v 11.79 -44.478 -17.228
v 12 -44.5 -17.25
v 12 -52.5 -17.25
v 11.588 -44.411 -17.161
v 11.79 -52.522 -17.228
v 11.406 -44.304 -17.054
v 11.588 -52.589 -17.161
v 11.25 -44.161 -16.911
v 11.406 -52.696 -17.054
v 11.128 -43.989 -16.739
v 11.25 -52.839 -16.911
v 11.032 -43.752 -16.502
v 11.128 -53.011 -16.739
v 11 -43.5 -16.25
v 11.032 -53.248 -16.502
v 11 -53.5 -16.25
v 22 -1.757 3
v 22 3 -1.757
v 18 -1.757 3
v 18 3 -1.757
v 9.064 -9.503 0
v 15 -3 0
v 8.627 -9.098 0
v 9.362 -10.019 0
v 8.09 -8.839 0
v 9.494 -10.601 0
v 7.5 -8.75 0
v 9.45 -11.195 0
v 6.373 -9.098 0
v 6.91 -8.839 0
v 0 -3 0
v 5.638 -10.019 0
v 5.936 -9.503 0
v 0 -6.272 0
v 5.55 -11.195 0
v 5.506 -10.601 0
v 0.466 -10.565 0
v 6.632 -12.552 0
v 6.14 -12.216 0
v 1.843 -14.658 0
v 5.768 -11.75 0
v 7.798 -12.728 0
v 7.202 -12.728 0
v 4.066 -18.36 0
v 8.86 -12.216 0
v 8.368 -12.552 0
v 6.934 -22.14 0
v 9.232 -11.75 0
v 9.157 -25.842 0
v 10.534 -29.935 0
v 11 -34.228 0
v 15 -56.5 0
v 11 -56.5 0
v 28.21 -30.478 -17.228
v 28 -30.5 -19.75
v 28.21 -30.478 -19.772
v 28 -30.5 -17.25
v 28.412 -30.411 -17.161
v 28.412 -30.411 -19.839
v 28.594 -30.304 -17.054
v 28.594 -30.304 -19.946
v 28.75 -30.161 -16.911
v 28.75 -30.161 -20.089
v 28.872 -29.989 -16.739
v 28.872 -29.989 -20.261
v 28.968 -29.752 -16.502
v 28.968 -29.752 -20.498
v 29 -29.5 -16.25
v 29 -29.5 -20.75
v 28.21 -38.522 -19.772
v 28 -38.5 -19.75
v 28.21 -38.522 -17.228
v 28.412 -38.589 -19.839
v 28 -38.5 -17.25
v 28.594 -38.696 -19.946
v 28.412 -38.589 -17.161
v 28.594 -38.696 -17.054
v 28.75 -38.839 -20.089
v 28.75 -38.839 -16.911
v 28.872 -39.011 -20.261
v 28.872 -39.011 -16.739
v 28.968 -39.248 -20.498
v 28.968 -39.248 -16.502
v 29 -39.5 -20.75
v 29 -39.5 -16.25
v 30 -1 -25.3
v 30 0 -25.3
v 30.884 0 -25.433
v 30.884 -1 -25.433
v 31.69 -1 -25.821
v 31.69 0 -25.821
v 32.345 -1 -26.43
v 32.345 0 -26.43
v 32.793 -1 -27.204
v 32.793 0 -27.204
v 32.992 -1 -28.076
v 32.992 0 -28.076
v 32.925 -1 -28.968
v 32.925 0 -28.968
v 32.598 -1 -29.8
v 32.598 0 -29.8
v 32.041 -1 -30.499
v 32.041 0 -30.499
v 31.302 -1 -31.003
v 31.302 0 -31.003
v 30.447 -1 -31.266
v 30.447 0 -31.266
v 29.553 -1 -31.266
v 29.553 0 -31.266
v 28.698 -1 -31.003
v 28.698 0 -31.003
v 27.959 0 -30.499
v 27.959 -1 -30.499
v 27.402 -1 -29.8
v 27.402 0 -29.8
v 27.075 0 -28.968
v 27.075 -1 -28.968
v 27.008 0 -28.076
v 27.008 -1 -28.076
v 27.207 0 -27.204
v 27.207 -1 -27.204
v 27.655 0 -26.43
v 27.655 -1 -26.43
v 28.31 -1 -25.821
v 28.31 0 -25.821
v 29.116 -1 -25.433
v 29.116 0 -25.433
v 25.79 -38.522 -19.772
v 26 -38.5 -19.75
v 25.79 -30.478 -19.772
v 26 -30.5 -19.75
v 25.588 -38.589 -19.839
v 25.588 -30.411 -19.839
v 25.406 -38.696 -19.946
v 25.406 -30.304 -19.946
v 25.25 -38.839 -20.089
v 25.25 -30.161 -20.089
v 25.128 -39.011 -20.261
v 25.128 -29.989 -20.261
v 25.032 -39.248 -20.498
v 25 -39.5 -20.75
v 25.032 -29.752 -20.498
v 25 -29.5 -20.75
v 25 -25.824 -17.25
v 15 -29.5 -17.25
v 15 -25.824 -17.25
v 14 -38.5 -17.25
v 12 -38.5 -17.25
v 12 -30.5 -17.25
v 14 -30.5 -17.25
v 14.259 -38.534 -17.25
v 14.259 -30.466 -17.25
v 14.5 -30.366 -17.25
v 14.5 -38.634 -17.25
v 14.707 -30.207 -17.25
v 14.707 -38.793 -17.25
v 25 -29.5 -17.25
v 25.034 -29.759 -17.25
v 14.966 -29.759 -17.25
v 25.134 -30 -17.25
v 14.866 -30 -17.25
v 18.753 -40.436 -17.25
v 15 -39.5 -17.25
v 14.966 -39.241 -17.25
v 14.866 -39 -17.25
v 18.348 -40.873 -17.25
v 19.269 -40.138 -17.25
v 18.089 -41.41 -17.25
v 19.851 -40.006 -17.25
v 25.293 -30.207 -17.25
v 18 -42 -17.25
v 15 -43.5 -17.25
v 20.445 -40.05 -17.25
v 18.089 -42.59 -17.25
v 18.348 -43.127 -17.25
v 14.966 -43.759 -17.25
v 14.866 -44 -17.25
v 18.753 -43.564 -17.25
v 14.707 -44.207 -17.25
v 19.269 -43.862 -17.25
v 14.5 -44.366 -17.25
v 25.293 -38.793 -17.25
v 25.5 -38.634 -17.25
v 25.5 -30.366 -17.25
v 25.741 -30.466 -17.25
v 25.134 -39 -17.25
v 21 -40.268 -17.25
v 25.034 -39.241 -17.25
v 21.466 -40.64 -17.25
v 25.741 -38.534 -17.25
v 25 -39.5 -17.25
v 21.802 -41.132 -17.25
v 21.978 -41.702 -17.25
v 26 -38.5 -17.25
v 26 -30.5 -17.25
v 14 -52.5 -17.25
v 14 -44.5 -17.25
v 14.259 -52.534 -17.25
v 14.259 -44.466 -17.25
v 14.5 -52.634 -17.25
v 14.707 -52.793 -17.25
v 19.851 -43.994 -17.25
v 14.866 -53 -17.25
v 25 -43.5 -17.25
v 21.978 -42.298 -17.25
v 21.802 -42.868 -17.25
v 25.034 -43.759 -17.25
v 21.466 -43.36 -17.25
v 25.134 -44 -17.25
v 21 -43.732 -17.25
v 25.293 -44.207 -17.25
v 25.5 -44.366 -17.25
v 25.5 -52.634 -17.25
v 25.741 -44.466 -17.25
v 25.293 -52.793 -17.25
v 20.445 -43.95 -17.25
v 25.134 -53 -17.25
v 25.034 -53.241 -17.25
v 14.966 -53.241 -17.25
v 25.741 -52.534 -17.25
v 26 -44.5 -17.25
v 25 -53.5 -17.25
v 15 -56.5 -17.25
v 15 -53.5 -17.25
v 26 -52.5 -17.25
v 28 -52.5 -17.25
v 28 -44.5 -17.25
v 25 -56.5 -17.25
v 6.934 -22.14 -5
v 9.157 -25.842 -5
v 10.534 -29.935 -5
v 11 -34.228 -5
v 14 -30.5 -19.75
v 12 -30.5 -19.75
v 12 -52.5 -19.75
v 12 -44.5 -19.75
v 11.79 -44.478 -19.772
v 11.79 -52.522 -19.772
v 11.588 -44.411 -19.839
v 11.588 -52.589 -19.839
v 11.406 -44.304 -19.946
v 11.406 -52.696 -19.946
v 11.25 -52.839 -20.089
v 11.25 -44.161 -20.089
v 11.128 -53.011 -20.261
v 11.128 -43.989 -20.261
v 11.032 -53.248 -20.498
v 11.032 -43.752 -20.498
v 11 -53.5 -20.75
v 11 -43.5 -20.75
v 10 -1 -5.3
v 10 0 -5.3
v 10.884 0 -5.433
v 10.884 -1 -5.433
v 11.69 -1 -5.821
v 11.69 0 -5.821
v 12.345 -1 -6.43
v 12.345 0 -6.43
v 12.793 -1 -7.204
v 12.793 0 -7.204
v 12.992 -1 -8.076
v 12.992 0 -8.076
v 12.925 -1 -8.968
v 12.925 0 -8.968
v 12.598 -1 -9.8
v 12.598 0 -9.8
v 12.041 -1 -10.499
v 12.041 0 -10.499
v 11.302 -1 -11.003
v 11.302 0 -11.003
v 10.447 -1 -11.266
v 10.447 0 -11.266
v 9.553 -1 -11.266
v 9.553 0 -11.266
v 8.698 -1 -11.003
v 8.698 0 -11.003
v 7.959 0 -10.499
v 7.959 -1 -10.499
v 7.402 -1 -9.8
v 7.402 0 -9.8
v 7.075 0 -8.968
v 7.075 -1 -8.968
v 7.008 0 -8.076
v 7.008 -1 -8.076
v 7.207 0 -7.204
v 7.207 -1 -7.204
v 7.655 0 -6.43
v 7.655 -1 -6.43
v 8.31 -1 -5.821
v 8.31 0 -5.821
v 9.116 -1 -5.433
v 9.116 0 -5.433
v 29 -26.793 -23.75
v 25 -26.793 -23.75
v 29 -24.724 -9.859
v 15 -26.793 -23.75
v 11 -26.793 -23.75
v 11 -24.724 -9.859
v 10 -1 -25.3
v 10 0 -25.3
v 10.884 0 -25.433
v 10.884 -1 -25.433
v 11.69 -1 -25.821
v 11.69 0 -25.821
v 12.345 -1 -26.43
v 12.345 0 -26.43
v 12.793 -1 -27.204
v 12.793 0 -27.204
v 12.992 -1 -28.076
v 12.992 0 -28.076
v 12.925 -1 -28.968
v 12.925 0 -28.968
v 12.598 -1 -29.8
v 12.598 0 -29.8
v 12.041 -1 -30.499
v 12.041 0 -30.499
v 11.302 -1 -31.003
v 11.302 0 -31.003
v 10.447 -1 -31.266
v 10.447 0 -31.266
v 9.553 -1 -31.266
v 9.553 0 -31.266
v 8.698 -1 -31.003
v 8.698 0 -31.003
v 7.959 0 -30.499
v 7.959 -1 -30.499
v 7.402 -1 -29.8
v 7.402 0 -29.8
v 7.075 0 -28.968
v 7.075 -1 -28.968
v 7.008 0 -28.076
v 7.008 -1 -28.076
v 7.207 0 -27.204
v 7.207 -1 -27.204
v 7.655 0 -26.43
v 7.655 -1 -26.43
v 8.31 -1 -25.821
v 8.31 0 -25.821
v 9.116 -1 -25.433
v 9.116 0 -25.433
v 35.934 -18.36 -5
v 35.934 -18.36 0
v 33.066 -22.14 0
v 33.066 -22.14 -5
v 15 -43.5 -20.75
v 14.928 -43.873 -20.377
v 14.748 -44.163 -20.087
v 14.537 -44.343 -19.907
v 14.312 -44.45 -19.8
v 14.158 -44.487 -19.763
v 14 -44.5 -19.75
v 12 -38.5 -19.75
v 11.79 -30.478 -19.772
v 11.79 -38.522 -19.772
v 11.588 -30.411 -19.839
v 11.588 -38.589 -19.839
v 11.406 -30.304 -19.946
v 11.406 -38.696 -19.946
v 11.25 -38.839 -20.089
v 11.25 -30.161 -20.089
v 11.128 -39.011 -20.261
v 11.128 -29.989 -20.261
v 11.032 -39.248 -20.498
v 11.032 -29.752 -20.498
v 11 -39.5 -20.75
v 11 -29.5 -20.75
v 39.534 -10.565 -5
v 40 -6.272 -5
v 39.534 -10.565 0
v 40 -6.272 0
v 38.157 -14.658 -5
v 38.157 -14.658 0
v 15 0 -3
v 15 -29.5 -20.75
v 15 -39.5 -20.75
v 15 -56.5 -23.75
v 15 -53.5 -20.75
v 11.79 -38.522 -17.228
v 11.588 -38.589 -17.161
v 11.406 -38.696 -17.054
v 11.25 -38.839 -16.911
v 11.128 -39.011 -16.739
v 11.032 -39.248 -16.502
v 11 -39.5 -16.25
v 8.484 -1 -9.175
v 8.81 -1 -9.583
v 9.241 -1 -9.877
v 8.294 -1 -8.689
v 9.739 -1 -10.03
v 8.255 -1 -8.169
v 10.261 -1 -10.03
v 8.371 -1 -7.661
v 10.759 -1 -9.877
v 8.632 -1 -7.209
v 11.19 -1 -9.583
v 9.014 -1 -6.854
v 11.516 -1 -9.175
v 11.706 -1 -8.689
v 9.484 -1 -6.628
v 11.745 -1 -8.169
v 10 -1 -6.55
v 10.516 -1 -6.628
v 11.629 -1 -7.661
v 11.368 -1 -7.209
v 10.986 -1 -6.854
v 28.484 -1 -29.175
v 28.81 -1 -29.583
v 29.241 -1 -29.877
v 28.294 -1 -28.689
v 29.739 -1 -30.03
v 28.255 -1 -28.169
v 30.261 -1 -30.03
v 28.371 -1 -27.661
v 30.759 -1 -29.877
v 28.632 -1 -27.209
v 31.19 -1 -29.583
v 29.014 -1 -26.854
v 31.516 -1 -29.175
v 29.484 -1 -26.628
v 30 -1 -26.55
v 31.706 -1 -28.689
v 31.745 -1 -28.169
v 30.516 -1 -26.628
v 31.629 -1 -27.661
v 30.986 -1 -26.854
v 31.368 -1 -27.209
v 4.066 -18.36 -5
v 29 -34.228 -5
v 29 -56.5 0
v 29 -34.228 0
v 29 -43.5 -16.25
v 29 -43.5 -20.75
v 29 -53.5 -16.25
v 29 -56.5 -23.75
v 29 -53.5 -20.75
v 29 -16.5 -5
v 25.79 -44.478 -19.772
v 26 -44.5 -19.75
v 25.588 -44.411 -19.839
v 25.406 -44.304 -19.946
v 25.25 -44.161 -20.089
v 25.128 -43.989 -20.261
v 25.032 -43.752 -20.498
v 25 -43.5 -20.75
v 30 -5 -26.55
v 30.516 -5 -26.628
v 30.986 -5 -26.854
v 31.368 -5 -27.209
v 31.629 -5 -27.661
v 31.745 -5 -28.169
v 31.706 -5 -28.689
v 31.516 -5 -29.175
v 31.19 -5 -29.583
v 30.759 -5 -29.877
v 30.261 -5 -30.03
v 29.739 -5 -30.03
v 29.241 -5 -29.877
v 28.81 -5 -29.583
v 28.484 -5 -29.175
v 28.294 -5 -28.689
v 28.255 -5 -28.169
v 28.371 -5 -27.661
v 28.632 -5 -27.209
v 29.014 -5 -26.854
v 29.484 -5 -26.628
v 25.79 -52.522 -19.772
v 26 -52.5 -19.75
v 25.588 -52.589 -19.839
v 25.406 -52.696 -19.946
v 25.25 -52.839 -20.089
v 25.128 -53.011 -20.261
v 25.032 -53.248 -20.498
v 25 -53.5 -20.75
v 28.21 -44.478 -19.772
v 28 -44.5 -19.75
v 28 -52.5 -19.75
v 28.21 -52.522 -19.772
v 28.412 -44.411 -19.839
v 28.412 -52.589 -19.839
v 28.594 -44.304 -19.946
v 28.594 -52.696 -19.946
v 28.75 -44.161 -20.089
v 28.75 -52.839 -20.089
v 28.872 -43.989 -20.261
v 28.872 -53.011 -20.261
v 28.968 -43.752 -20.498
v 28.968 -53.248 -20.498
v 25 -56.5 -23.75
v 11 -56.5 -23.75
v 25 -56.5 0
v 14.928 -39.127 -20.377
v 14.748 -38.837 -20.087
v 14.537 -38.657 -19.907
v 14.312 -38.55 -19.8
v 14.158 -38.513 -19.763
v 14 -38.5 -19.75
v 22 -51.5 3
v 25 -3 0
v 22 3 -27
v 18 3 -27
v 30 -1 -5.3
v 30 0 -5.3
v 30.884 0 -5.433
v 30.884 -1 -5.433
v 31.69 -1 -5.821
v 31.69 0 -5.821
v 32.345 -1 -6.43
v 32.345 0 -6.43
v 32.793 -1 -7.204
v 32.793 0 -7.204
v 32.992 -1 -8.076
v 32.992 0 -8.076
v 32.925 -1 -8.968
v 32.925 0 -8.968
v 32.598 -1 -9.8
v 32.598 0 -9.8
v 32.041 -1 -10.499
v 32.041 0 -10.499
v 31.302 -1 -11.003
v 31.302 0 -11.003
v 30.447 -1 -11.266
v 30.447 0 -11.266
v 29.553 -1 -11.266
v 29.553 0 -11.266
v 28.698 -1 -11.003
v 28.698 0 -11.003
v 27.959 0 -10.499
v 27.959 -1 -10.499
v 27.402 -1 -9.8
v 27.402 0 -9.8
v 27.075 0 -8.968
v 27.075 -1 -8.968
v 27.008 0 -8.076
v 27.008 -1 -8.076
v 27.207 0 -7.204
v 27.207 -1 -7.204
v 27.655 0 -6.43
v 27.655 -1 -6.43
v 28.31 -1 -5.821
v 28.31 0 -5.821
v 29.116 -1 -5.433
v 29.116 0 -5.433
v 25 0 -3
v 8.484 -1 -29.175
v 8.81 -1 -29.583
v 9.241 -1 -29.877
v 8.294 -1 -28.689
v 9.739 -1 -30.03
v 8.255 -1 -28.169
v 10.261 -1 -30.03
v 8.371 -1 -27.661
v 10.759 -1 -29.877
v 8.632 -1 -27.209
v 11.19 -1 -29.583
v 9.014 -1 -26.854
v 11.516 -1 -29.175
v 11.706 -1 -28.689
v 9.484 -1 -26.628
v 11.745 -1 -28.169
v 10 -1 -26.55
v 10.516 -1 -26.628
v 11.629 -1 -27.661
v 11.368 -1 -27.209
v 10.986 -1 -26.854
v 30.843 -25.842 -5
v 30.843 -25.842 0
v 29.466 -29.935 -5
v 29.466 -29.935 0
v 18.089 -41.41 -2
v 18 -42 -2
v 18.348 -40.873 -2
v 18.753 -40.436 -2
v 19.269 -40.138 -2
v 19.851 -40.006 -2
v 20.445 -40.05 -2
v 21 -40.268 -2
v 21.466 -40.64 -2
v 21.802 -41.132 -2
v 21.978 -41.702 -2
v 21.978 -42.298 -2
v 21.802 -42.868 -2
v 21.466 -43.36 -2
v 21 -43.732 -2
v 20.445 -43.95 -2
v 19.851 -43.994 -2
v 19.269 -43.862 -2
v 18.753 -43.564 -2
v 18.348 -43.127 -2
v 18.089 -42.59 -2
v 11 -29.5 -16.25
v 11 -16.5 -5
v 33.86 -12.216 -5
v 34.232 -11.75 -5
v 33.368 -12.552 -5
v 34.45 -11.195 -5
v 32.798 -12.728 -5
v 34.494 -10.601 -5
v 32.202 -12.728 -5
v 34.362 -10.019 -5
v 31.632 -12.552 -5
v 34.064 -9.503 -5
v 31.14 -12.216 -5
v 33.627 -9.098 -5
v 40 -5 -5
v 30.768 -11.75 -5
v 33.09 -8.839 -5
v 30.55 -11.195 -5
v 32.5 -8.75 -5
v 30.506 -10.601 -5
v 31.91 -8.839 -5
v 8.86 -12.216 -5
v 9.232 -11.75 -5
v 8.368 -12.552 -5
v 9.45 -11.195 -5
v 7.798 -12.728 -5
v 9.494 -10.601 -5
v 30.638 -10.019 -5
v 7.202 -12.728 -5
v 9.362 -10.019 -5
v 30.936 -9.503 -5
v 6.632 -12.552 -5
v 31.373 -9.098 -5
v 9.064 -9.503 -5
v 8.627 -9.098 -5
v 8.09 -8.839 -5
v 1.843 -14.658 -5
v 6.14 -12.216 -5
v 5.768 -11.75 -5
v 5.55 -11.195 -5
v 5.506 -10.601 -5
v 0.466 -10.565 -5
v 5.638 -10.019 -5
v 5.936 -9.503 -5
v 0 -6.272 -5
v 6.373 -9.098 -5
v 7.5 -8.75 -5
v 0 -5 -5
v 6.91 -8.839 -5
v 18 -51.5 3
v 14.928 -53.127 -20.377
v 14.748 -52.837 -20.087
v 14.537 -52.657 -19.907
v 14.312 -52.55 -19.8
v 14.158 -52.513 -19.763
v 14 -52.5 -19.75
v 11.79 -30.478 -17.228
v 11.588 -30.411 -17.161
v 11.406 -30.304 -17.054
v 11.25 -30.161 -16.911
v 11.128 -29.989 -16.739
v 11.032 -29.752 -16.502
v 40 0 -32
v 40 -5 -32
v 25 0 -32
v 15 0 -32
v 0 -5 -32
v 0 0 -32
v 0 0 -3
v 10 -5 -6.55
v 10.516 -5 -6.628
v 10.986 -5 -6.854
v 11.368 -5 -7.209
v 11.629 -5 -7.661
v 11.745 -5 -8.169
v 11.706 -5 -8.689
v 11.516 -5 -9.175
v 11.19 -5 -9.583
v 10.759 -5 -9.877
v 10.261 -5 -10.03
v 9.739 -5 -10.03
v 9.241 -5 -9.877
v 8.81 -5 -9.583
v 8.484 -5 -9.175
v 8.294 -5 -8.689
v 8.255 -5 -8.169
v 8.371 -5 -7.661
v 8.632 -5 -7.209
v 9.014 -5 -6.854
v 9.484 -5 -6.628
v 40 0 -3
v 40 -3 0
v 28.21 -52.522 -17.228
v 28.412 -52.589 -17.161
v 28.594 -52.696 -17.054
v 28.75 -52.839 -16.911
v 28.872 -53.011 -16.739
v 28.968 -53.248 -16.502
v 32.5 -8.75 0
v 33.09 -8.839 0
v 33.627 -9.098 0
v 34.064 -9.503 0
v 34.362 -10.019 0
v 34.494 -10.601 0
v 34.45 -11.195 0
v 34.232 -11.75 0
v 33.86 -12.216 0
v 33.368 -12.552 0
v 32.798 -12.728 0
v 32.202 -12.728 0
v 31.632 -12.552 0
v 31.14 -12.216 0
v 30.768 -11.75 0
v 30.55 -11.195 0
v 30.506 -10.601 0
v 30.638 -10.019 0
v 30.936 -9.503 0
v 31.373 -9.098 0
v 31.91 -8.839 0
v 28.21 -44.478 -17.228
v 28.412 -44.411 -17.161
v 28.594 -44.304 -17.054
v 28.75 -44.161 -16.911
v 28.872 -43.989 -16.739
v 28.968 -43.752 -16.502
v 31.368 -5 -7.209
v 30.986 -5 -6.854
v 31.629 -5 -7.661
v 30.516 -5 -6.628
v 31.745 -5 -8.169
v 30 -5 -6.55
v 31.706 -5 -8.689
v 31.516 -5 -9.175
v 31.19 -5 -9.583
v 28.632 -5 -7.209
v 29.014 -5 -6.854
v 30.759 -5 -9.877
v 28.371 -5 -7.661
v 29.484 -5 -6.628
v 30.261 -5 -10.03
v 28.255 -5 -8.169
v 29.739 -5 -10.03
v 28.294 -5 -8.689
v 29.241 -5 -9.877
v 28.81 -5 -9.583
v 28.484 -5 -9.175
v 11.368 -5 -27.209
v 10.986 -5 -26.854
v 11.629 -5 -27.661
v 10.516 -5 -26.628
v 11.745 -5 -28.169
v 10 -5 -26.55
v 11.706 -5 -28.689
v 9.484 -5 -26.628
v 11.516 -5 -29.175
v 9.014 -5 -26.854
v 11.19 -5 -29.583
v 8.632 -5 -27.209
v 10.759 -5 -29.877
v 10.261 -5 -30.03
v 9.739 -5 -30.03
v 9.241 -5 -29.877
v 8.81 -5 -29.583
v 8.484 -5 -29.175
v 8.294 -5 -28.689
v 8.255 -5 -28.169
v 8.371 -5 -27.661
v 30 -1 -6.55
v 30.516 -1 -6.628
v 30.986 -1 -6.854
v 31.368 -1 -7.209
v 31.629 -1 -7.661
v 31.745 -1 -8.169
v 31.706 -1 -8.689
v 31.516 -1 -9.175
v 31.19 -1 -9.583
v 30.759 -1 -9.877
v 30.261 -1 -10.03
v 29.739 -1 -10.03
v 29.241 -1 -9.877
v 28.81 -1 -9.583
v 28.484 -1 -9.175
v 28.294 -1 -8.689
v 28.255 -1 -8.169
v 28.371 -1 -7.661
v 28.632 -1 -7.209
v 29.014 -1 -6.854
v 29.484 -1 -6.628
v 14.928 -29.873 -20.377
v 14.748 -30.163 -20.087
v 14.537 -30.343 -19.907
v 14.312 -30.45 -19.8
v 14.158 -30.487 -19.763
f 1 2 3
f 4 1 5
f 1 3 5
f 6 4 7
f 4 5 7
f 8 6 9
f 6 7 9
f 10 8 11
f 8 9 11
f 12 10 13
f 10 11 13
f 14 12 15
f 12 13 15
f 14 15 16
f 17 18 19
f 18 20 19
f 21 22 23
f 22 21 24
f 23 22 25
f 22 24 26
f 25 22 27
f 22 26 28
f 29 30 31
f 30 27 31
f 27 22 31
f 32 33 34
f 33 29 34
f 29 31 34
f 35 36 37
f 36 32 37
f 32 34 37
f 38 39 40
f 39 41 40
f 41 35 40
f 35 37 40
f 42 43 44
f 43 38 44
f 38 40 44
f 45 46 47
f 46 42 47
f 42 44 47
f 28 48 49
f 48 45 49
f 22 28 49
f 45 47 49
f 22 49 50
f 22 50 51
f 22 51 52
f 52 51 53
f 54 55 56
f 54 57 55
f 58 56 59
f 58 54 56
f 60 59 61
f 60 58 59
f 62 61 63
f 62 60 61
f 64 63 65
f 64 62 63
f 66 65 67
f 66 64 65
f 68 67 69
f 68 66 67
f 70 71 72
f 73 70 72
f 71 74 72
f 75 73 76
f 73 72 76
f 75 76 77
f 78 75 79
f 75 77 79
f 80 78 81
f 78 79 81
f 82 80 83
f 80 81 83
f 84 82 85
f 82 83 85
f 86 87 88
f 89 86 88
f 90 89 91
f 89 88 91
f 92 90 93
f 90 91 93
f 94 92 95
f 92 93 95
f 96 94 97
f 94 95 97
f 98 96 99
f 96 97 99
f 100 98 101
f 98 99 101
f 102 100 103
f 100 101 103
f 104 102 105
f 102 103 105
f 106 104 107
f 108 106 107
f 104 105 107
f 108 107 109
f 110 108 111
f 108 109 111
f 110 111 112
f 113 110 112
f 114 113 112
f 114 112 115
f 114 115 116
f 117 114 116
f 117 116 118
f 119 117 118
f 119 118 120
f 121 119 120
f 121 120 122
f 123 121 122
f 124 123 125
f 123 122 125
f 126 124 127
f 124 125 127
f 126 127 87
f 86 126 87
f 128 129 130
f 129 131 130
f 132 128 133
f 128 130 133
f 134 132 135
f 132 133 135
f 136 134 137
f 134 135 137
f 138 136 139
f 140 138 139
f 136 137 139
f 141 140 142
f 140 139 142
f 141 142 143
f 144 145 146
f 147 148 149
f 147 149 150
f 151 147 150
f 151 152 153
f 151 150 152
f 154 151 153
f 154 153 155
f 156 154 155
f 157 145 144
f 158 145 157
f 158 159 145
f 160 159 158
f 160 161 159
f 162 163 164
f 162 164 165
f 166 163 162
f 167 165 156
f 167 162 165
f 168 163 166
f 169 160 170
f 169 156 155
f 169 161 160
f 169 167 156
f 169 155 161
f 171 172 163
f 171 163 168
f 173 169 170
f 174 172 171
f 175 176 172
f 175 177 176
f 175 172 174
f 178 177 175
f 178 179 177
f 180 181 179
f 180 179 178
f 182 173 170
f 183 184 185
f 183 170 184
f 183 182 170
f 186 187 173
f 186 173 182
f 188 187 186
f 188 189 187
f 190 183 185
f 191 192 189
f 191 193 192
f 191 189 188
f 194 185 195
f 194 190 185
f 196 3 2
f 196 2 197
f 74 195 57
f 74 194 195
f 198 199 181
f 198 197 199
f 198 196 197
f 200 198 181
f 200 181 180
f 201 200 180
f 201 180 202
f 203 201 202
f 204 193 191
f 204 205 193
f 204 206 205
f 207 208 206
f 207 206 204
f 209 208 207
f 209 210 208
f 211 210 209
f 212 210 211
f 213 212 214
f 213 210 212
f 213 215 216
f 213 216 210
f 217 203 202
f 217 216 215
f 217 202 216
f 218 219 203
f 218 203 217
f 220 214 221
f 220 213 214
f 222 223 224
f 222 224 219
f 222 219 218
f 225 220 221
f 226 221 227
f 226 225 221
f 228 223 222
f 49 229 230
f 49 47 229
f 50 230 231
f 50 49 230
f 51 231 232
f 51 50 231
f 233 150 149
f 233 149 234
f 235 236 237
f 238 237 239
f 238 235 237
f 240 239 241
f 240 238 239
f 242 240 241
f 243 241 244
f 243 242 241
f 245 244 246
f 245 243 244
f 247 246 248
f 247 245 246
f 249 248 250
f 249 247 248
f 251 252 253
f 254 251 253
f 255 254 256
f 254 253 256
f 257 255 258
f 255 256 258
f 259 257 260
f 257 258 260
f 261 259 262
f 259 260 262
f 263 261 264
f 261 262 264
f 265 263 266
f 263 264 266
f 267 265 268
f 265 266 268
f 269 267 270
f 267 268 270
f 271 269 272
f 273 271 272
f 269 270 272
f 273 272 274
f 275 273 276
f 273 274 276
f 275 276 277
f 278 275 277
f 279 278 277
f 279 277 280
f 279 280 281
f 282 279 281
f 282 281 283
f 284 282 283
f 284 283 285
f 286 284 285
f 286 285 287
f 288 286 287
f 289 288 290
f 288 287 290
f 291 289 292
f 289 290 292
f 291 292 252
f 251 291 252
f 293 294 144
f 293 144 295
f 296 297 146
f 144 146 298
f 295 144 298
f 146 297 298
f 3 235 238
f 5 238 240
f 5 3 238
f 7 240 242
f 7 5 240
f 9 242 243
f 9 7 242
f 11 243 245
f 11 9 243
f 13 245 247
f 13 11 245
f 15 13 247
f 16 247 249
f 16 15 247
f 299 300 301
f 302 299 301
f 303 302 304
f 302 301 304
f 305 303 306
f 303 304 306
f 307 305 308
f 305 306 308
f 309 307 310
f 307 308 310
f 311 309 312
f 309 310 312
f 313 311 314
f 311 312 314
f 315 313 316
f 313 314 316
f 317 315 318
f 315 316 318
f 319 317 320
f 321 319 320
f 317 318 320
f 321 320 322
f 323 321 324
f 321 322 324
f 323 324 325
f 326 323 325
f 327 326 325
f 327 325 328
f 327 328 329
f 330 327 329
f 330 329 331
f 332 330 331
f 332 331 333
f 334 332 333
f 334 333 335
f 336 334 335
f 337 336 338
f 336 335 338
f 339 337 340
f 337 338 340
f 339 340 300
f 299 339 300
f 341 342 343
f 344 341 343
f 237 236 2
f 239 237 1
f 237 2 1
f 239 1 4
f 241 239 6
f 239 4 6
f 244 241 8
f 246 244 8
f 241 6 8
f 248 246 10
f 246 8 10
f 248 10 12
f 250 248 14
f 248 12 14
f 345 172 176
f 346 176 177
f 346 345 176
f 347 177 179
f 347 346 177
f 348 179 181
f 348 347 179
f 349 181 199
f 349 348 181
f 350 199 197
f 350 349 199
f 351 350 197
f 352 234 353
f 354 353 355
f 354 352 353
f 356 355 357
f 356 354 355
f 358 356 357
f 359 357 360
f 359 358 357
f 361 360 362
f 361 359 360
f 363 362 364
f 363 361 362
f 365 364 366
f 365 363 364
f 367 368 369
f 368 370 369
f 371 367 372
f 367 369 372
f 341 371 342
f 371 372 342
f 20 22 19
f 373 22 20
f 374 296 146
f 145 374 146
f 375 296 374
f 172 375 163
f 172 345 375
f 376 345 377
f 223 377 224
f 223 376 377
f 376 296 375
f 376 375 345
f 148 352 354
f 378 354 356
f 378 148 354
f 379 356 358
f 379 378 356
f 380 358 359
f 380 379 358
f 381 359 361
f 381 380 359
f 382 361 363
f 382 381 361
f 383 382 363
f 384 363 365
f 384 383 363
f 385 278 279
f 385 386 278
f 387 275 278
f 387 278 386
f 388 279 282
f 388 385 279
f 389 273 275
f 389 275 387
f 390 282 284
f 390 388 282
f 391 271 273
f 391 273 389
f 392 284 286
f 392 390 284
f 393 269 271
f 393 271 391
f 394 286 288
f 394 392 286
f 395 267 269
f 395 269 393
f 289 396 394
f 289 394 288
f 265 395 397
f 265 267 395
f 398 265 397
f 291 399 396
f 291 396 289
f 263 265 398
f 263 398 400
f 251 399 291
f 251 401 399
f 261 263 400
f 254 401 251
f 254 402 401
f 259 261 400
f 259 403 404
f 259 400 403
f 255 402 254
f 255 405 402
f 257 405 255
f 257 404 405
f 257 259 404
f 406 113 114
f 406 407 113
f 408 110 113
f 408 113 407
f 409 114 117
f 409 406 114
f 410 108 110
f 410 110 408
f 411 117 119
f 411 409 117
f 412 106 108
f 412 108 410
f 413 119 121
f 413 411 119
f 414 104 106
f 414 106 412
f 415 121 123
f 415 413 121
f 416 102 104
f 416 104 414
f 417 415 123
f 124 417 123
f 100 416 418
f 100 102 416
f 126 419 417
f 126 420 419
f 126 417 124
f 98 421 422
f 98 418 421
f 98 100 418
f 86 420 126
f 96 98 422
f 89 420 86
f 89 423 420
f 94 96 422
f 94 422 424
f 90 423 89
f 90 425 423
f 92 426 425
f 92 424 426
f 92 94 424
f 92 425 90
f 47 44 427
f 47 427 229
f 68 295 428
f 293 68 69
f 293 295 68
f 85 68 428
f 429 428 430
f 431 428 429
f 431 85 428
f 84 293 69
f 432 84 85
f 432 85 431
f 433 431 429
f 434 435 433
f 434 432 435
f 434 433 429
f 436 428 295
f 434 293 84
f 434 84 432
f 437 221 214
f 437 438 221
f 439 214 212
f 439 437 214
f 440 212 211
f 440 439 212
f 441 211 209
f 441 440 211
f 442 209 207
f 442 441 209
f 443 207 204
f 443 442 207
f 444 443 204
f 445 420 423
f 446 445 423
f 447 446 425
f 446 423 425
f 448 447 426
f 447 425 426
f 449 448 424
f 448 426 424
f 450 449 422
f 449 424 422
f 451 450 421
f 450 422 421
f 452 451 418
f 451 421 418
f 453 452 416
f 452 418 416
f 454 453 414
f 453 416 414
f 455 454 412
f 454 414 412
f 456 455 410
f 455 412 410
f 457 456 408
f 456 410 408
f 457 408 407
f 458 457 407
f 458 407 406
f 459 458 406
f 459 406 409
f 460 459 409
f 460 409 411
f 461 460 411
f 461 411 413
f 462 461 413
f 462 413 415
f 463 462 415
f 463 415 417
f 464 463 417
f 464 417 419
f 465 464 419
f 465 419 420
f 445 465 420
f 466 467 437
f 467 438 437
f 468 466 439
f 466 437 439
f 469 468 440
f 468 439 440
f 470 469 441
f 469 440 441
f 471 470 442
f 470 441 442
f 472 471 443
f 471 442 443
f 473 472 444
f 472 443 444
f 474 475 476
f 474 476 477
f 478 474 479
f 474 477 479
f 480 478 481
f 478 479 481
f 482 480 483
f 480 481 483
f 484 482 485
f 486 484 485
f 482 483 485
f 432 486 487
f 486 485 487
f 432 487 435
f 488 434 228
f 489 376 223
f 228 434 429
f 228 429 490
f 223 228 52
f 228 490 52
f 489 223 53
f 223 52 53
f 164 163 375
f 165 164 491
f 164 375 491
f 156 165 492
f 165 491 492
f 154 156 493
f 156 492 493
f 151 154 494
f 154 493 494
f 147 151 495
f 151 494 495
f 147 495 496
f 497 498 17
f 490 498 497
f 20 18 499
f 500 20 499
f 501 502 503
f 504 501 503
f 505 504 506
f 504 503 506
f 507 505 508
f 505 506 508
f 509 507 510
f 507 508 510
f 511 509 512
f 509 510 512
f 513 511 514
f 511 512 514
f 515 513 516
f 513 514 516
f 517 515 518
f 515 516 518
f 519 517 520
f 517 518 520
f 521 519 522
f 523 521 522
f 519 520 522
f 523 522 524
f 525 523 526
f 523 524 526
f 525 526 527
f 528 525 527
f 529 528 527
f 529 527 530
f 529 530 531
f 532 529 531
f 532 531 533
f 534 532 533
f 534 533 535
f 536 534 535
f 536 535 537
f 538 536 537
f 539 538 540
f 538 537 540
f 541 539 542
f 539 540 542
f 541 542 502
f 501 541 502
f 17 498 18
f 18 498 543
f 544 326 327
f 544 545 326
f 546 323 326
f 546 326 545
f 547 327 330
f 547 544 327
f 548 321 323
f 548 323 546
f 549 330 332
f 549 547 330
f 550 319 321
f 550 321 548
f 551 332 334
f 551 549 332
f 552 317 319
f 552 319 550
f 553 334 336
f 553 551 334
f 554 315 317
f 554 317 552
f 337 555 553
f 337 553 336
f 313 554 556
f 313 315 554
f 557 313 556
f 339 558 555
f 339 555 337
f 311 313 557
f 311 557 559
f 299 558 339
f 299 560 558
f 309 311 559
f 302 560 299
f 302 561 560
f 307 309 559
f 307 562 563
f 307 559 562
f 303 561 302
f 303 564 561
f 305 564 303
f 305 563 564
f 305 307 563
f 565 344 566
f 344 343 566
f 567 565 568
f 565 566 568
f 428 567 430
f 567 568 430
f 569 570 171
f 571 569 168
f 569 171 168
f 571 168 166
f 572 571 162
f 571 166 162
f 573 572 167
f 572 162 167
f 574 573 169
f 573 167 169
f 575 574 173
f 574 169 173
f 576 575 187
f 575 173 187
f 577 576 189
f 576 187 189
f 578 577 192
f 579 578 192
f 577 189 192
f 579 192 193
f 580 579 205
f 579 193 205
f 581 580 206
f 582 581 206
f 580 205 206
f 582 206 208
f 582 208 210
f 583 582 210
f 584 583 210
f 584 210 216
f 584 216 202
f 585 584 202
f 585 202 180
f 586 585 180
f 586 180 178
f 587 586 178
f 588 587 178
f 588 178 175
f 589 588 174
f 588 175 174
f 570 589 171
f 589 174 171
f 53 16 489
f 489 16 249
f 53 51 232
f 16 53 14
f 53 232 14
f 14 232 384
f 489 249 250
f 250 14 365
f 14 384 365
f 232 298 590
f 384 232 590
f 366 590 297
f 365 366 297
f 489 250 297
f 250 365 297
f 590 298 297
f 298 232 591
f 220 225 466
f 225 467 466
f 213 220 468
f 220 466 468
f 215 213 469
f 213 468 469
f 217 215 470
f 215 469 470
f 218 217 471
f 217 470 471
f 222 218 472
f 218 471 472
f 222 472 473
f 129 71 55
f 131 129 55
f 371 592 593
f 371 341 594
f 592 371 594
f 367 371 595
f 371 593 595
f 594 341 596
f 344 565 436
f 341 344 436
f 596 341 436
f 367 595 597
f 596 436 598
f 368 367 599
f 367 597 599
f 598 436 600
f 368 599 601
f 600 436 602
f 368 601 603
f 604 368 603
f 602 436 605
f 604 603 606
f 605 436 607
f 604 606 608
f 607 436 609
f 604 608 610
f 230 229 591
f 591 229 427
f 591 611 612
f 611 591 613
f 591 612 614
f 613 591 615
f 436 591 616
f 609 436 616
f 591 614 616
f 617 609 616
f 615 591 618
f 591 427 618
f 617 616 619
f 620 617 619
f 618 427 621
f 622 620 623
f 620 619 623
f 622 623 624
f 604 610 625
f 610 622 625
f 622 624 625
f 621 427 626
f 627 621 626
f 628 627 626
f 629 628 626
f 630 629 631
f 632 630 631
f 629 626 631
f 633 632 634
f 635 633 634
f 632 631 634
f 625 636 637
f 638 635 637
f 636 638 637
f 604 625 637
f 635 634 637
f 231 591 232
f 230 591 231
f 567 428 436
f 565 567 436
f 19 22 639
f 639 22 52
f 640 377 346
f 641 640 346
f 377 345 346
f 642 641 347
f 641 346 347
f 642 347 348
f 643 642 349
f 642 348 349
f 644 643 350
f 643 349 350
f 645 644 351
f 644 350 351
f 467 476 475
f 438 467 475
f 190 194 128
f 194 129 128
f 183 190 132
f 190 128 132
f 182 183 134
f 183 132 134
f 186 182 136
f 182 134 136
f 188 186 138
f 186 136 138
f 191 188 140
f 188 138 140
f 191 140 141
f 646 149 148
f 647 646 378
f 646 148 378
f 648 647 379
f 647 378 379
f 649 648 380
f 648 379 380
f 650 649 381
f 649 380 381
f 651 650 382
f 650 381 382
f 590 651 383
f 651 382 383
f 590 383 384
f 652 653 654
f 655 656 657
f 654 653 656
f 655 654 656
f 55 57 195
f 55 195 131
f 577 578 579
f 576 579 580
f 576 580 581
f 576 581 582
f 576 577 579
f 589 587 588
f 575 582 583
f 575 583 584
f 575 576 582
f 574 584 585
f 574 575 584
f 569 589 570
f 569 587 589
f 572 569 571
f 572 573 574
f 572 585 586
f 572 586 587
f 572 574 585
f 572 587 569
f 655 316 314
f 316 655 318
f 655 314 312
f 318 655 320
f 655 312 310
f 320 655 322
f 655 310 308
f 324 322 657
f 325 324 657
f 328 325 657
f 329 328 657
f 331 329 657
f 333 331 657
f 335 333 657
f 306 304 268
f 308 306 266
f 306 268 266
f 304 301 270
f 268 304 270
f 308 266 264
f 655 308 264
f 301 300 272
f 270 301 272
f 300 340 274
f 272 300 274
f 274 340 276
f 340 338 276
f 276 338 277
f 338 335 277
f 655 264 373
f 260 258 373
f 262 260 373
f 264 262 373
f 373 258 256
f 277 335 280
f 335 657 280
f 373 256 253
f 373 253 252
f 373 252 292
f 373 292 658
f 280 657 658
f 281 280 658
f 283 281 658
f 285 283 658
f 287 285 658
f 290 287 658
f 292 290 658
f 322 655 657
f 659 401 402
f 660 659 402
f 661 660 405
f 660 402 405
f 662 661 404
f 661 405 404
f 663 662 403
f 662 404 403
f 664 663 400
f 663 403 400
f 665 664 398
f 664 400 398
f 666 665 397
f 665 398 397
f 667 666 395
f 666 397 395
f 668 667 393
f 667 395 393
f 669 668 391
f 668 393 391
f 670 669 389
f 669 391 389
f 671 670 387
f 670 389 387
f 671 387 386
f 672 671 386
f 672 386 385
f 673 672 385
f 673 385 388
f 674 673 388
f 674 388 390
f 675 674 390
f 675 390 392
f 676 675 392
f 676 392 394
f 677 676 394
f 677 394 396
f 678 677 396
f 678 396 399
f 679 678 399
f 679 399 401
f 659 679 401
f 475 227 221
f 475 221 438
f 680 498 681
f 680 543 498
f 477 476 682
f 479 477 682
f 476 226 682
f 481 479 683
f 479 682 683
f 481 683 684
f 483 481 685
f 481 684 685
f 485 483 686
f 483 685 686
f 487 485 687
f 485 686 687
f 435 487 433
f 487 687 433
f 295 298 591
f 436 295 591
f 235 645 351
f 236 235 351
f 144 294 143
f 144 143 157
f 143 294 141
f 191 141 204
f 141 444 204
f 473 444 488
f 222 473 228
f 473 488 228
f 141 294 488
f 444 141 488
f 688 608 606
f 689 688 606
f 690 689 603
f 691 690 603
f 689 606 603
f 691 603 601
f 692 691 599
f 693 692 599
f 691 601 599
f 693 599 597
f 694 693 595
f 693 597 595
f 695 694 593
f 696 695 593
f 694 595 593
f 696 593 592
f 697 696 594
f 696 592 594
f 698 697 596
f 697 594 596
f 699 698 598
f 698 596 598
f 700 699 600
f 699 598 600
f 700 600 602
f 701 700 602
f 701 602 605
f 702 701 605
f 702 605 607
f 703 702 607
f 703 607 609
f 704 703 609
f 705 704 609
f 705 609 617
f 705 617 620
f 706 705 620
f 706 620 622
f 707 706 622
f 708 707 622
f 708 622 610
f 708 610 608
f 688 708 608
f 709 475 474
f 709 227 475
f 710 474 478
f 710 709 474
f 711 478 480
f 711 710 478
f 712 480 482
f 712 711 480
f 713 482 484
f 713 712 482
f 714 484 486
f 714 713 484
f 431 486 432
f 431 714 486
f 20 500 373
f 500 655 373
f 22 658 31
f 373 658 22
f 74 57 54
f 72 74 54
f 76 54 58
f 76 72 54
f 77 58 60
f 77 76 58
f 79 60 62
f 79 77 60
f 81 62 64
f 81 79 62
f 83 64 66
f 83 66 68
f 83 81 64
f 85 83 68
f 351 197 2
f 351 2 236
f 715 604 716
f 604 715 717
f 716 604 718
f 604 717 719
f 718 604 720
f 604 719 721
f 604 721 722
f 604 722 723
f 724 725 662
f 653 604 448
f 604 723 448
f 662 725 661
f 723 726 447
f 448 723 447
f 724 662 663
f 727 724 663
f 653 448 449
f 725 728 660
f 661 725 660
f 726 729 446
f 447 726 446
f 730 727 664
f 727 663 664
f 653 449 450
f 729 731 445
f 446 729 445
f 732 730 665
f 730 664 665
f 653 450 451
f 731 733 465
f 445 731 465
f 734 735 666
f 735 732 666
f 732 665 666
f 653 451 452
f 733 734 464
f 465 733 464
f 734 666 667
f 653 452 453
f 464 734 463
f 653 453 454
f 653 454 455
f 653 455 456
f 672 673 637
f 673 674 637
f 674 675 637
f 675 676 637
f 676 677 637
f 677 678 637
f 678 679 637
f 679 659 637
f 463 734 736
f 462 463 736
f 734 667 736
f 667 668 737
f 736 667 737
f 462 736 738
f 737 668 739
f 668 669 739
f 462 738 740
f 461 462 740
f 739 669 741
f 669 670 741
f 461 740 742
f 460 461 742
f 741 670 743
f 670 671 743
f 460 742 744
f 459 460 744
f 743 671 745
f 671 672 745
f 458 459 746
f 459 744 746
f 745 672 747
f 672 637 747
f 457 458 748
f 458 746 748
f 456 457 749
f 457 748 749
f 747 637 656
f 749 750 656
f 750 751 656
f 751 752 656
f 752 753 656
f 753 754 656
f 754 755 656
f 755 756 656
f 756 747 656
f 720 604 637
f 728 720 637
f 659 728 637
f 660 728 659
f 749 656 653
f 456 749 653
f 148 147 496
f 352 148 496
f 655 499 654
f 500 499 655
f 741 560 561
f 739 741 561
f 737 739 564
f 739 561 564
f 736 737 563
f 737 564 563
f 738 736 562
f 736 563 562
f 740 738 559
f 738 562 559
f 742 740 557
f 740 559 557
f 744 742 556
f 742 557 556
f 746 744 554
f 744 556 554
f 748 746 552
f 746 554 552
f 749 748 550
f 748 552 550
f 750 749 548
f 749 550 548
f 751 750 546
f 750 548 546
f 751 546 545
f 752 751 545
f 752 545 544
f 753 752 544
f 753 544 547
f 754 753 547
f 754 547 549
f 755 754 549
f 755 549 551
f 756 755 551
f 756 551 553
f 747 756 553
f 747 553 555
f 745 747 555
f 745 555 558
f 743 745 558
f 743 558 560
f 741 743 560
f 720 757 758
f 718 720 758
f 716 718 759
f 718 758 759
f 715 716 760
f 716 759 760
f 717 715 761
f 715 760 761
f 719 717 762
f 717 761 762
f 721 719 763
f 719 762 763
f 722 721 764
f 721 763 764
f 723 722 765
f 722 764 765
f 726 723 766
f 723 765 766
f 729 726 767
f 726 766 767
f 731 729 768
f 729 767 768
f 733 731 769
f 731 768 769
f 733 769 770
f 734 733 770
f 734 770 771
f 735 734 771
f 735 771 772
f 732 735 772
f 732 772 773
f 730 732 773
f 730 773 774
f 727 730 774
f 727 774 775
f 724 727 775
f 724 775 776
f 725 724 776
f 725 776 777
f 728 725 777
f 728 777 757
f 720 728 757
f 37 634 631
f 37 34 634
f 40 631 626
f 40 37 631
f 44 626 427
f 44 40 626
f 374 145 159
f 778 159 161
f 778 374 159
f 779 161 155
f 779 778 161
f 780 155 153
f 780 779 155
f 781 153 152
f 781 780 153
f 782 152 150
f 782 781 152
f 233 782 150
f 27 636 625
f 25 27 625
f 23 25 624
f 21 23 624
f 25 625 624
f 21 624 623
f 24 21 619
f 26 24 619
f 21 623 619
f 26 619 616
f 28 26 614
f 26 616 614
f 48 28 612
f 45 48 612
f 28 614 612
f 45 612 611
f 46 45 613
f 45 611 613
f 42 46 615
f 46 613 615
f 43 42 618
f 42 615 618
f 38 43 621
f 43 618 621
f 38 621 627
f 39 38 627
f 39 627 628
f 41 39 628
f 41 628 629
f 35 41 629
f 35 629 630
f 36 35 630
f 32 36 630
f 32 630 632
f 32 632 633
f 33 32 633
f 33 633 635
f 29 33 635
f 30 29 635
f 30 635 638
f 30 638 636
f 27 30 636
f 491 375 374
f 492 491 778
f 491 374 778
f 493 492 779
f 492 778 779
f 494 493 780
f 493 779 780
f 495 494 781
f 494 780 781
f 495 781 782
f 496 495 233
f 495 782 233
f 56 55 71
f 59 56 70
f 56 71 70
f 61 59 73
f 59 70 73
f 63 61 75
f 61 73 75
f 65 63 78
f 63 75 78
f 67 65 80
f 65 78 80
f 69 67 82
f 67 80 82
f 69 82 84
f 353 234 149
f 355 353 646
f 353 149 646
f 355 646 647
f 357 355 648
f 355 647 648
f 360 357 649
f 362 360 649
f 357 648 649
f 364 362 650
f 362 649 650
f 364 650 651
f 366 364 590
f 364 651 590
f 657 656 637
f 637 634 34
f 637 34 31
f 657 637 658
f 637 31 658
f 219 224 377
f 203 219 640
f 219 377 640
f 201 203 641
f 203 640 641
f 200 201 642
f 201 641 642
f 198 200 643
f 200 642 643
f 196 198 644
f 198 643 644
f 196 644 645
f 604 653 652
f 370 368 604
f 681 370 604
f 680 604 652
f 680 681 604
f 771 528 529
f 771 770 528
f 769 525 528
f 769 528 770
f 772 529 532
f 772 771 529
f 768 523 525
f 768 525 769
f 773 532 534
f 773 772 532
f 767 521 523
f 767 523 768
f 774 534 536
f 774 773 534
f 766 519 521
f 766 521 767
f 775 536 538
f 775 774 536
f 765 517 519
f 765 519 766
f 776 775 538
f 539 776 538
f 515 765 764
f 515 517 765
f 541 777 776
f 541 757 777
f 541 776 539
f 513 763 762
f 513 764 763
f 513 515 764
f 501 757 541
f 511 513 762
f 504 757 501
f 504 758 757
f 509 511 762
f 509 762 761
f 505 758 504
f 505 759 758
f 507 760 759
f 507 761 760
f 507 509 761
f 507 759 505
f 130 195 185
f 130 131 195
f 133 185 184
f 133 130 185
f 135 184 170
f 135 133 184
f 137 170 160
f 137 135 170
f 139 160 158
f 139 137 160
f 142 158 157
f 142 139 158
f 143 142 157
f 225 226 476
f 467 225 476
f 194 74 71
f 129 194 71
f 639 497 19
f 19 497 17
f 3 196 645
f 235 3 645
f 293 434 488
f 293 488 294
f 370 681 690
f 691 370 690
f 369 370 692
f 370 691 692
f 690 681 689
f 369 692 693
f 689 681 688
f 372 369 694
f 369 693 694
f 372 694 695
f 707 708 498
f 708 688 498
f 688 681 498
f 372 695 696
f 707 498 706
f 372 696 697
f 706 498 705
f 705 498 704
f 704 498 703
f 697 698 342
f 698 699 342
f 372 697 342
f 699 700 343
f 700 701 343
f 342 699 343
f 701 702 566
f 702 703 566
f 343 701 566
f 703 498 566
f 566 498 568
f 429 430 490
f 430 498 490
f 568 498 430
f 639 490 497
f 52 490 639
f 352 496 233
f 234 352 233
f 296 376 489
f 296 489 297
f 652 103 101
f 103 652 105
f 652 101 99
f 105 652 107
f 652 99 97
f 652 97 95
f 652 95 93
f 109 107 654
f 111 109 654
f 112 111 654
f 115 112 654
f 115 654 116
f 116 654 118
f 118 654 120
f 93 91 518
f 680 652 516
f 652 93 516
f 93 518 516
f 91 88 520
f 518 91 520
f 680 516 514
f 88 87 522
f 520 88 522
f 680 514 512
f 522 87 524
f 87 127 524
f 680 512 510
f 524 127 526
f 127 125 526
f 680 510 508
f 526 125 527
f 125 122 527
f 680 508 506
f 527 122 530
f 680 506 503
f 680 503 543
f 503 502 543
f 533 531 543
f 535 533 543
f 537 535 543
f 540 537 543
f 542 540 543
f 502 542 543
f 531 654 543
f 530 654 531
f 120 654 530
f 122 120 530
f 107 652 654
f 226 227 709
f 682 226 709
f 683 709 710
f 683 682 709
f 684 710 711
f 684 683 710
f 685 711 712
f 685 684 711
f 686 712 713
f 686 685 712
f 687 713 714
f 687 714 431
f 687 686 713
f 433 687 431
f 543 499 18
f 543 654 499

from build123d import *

# Parameters (mm, degrees)
BOSS_EXTRUDE1_DEPTH      = 40
SKETCH2_W                = 40
SKETCH2_H                = 29
BOSS_EXTRUDE2_DEPTH      = 23.5
SKETCH3_W                = 2.5
SKETCH3_H                = 8
CUT_EXTRUDE1_DEPTH       = 77.264342913
CUT_EXTRUDE2_REACH       = 76.863
SKETCH4_W                = 10
SKETCH4_H                = 29
CUT_EXTRUDE3_DEPTH       = 75.863208587
FILLET1_R                = 20
SKETCH6_R                = 2
CUT_EXTRUDE4_DEPTH       = 15.25
CUT_EXTRUDE5_REACH       = 78.264
SKETCH7_R                = 1.75
SKETCH8_R                = 3
CUT_EXTRUDE6_DEPTH       = 1
BOSS_EXTRUDE4_DEPTH      = 2
BOSS_EXTRUDE4_DEPTH_BACK = 2
CHAMFER1_SIZE            = 3
CHAMFER1_SIZE2           = 5
CHAMFER2_SIZE            = 5
CHAMFER2_SIZE2           = 3
CHAMFER3_SIZE            = 3
CHAMFER4_SIZE            = 3
CUT_EXTRUDE7_REACH       = 70.558
BOSS_EXTRUDE5_REACH      = 73.114
SKETCH12_W               = 10
SKETCH12_H               = 11.25
CUT_EXTRUDE8_DEPTH       = 2
FILLET2_R                = 1
SKETCH13_W               = 4.75
SKETCH13_H               = 32.080750089
CUT_EXTRUDE9_DEPTH       = 72.114344545
CUT_EXTRUDE10_REACH      = 76.305
SKETCH14_R               = 2


with BuildPart() as part:
    # Sketch1 → Boss-Extrude1 (new body)
    with BuildSketch(Plane(origin=(0, 0, 0), x_dir=(0, 0, -1), z_dir=(1, 0, 0))):
        Polygon((0, 0), (0, -56.5), (5, -56.5), (5, -5), (32, -5), (32, 0), align=None)
    extrude(amount=BOSS_EXTRUDE1_DEPTH)

    # Sketch2 → Boss-Extrude2 (add)
    with BuildSketch(Plane(origin=(0, 0, -5), x_dir=(-1, 0, 0), z_dir=(0, 0, -1))):
        with Locations((-20, -42)):
            Rectangle(SKETCH2_W, SKETCH2_H)
    extrude(amount=BOSS_EXTRUDE2_DEPTH)

    # Sketch3 → Cut-Extrude1 (cut, through all)
    with BuildSketch(Plane(origin=(40, 0, 0), x_dir=(0, 0, -1), z_dir=(1, 0, 0))):
        with Locations((18.5, -34.5)):
            Rectangle(SKETCH3_W, SKETCH3_H)
        with Locations((18.5, -48.5)):
            Rectangle(SKETCH3_W, SKETCH3_H)
    extrude(amount=-CUT_EXTRUDE1_DEPTH, mode=Mode.SUBTRACT)

    # Cut-Extrude2: up to this face of the body (flat: up to its plane)
    cut_extrude2_end = Plane(part.part.faces().sort_by_distance((20, -34.5, -17.25))[0])
    # Sketch4 → Cut-Extrude2 (cut, up to the picked face)
    with BuildSketch(Plane(origin=(0, 0, -28.5), x_dir=(-1, 0, 0), z_dir=(0, 0, -1)), mode=Mode.PRIVATE) as cut_extrude2_sk1:
        with Locations((-20, -42)):
            Rectangle(SKETCH4_W, SKETCH4_H)
    cut_extrude2_tool1 = split(extrude(cut_extrude2_sk1.sketch, amount=-CUT_EXTRUDE2_REACH, mode=Mode.PRIVATE), bisect_by=cut_extrude2_end, keep=Keep.BOTH, mode=Mode.PRIVATE)
    add(cut_extrude2_tool1.solids().sort_by(Axis((20, -42, -28.5), (0, 0, 1)))[0], mode=Mode.SUBTRACT)

    # Sketch5 → Cut-Extrude3 (cut, through all)
    with BuildSketch(Plane(origin=(0, 0, -28.5), x_dir=(-1, 0, 0), z_dir=(0, 0, -1))):
        Polygon((-29, -27.5), (-29, -56.5), (-40, -56.5), (-40, -13), align=None)
        Polygon((0, -56.5), (0, -13), (-11, -27.5), (-11, -56.5), align=None)
    extrude(amount=-CUT_EXTRUDE3_DEPTH, mode=Mode.SUBTRACT)

    # Fillet1
    fillet1_edges = [part.edges().sort_by_distance(p)[0] for p in [
        (40, -13, -2.5),
        (29, -27.5, -2.5),
        (11, -27.5, -2.5),
        (0, -13, -2.5),
    ]]
    fillet(fillet1_edges, radius=FILLET1_R)

    # Sketch6 → Cut-Extrude4 (cut)
    with BuildSketch(Plane(origin=(0, 0, -17.25), x_dir=(-1, 0, 0), z_dir=(0, 0, -1))):
        with Locations((-20, -42)):
            Circle(SKETCH6_R)
    extrude(amount=-CUT_EXTRUDE4_DEPTH, mode=Mode.SUBTRACT)

    # Sketch7 → Cut-Extrude5 (cut, up to next)
    with BuildSketch(Plane(origin=(0, 0, 0), x_dir=(1, 0, 0), z_dir=(0, 1, 0)), mode=Mode.PRIVATE) as cut_extrude5_sk1:
        with Locations(Location((30, 28.3, 0), (0, 0, 270))):
            Circle(SKETCH7_R)
    cut_extrude5_tool1 = extrude(cut_extrude5_sk1.sketch, amount=-CUT_EXTRUDE5_REACH, mode=Mode.PRIVATE) & part.part
    # Sketch7 → Cut-Extrude5 (cut, up to next)
    with BuildSketch(Plane(origin=(0, 0, 0), x_dir=(1, 0, 0), z_dir=(0, 1, 0)), mode=Mode.PRIVATE) as cut_extrude5_sk2:
        with Locations(Location((30, 8.3, 0), (0, 0, 270))):
            Circle(SKETCH7_R)
    cut_extrude5_tool2 = extrude(cut_extrude5_sk2.sketch, amount=-CUT_EXTRUDE5_REACH, mode=Mode.PRIVATE) & part.part
    # Sketch7 → Cut-Extrude5 (cut, up to next)
    with BuildSketch(Plane(origin=(0, 0, 0), x_dir=(1, 0, 0), z_dir=(0, 1, 0)), mode=Mode.PRIVATE) as cut_extrude5_sk3:
        with Locations(Location((10, 8.3, 0), (0, 0, 270))):
            Circle(SKETCH7_R)
    cut_extrude5_tool3 = extrude(cut_extrude5_sk3.sketch, amount=-CUT_EXTRUDE5_REACH, mode=Mode.PRIVATE) & part.part
    # Sketch7 → Cut-Extrude5 (cut, up to next)
    with BuildSketch(Plane(origin=(0, 0, 0), x_dir=(1, 0, 0), z_dir=(0, 1, 0)), mode=Mode.PRIVATE) as cut_extrude5_sk4:
        with Locations(Location((10, 28.3, 0), (0, 0, 270))):
            Circle(SKETCH7_R)
    cut_extrude5_tool4 = extrude(cut_extrude5_sk4.sketch, amount=-CUT_EXTRUDE5_REACH, mode=Mode.PRIVATE) & part.part
    add(cut_extrude5_tool1.solids().sort_by_distance((30, 0, -28.3))[0], mode=Mode.SUBTRACT)
    add(cut_extrude5_tool2.solids().sort_by_distance((30, 0, -8.3))[0], mode=Mode.SUBTRACT)
    add(cut_extrude5_tool3.solids().sort_by_distance((10, 0, -8.3))[0], mode=Mode.SUBTRACT)
    add(cut_extrude5_tool4.solids().sort_by_distance((10, 0, -28.3))[0], mode=Mode.SUBTRACT)

    # Sketch8 → Cut-Extrude6 (cut)
    with BuildSketch(Plane(origin=(0, 0, 0), x_dir=(1, 0, 0), z_dir=(0, 1, 0))):
        with Locations(Location((30, 28.3, 0), (0, 0, 270))):
            Circle(SKETCH8_R)
        with Locations(Location((30, 8.3, 0), (0, 0, 270))):
            Circle(SKETCH8_R)
        with Locations(Location((10, 8.3, 0), (0, 0, 270))):
            Circle(SKETCH8_R)
        with Locations(Location((10, 28.3, 0), (0, 0, 270))):
            Circle(SKETCH8_R)
    extrude(amount=-CUT_EXTRUDE6_DEPTH, mode=Mode.SUBTRACT)

    # Sketch9 → Boss-Extrude4 (add, two sides: drawn at the far end of the back side and taken through both)
    with BuildSketch(Plane.ZY.offset(-20).offset(-BOSS_EXTRUDE4_DEPTH_BACK)):
        Polygon((-32, 0), (0, 0), (0, -56.5), (3, -56.5), (3, 3), (-32, 3), align=None)
    extrude(amount=BOSS_EXTRUDE4_DEPTH + BOSS_EXTRUDE4_DEPTH_BACK)

    # Chamfer1
    chamfer1_edges = [part.edges().sort_by_distance(p)[0] for p in [
        (20, 3, -32),
    ]]
    chamfer1_side = [part.faces().sort_by_distance(p)[0] for p in [
        (20, -2.273584906, -32),
    ]]
    chamfer(chamfer1_edges, length=CHAMFER1_SIZE, length2=CHAMFER1_SIZE2, reference=chamfer1_side[0])

    # Chamfer2
    chamfer2_edges = [part.edges().sort_by_distance(p)[0] for p in [
        (20, -56.5, 3),
    ]]
    chamfer2_side = [part.faces().sort_by_distance(p)[0] for p in [
        (20, -26.75, 3),
    ]]
    chamfer(chamfer2_edges, length=CHAMFER2_SIZE, length2=CHAMFER2_SIZE2, reference=chamfer2_side[0])

    # Chamfer3
    chamfer3_edges = [part.edges().sort_by_distance(p)[0] for p in [
        (31, 0, 0),
        (9, 0, 0),
        (20, 3, 3),
    ]]
    chamfer(chamfer3_edges, length=CHAMFER3_SIZE)

    # Chamfer4
    chamfer4_edges = [part.edges().sort_by_distance(p)[0] for p in [
        (18, -29.75, 0),
        (18, -1.5, -1.5),
        (18, 0, -17.5),
        (22, -29.75, 0),
        (22, -1.5, -1.5),
        (22, 0, -17.5),
    ]]
    chamfer(chamfer4_edges, length=CHAMFER4_SIZE - 0.0001)  # a hair under: the kernel refuses the full size

    # Cut-Extrude7: up to this plane
    cut_extrude7_end = Plane(origin=(22, 0.621320344, 0.621320344), z_dir=(0.7071067811865434, 0.500000000000003, 0.500000000000003))
    # Sketch10 → Cut-Extrude7 (cut, up to the surface)
    with BuildSketch(Plane.ZY.offset(-18), mode=Mode.PRIVATE) as cut_extrude7_sk1:
        Polygon((-1.757359313, 3), (3, -1.757359313), (3, 0), (0, 3), align=None)
    cut_extrude7_tool1 = split(extrude(cut_extrude7_sk1.sketch, amount=-CUT_EXTRUDE7_REACH, mode=Mode.PRIVATE), bisect_by=cut_extrude7_end, keep=Keep.BOTH, mode=Mode.PRIVATE)
    add(cut_extrude7_tool1.solids().sort_by_distance((18, 1.027484, 1.027484))[0], mode=Mode.SUBTRACT)


with BuildPart() as cut_extrude7_kept_piece:
    # of the separate pieces the step leaves, the one the design keeps (cut_extrude7_pieces_kept)
    add(part.part.solids().sort_by_distance((18, -1.757400734, 2.9999))[0])

    # Boss-Extrude5: up to this face of the body (flat: up to its plane)
    boss_extrude5_end = Plane(cut_extrude7_kept_piece.part.faces().sort_by_distance((29, -42.52414206, -14.549200751))[0])
    # Sketch11 → Boss-Extrude5 (add, up to the picked face)
    with BuildSketch(Plane.ZY.offset(-11), mode=Mode.PRIVATE) as boss_extrude5_sk1:
        Polygon((-28.5, -27.5), (-9.859490986, -24.723753977), (-5, -16.5), (-5, -27.5), align=None)
    boss_extrude5_tool1 = split(extrude(boss_extrude5_sk1.sketch, amount=-BOSS_EXTRUDE5_REACH, mode=Mode.PRIVATE), bisect_by=boss_extrude5_end, keep=Keep.BOTH, mode=Mode.PRIVATE)
    add(boss_extrude5_tool1.solids().sort_by(Axis((11, -24.923314, -10.92545), (1, 0, 0)))[0])

    # Sketch12 → Cut-Extrude8 (cut)
    with BuildSketch(Plane.XZ.offset(27.5)):
        with Locations((20, -22.875)):
            Rectangle(SKETCH12_W, SKETCH12_H)
    extrude(amount=-CUT_EXTRUDE8_DEPTH, mode=Mode.SUBTRACT)

    # Fillet2
    fillet2_edges = [cut_extrude7_kept_piece.edges().sort_by_distance(p)[0] for p in [
        (29, -30.5, -18.5),
        (11, -34.5, -17.25),
        (11, -48.5, -17.25),
        (29, -38.5, -18.5),
        (29, -34.5, -19.75),
        (29, -34.5, -17.25),
        (29, -52.5, -18.5),
        (29, -48.5, -19.75),
        (29, -44.5, -18.5),
        (29, -48.5, -17.25),
        (11, -30.5, -18.5),
        (11, -34.5, -19.75),
        (11, -38.5, -18.5),
        (11, -44.5, -18.5),
        (11, -48.5, -19.75),
        (11, -52.5, -18.5),
        (25, -30.5, -18.5),
        (15, -30.5, -18.5),
        (15, -52.5, -18.5),
        (15, -48.5, -19.75),
        (15, -44.5, -18.5),
        (15, -38.5, -18.5),
        (15, -34.5, -19.75),
        (25, -48.5, -19.75),
        (25, -52.5, -18.5),
        (25, -34.5, -19.75),
        (25, -38.5, -18.5),
        (25, -44.5, -18.5),
    ]]
    fillet(fillet2_edges, radius=FILLET2_R)

    # Sketch13 → Cut-Extrude9 (cut, through all)
    with BuildSketch(Plane(origin=(29, 0, 0), x_dir=(0, 0, -1), z_dir=(1, 0, 0))):
        with Locations((26.125, -40.459624956)):
            Rectangle(SKETCH13_W, SKETCH13_H)
    extrude(amount=-CUT_EXTRUDE9_DEPTH, mode=Mode.SUBTRACT)

    # Sketch14 → Cut-Extrude10 (cut, up to next)
    with BuildSketch(Plane(origin=(0, 0, -5), x_dir=(-1, 0, 0), z_dir=(0, 0, -1)), mode=Mode.PRIVATE) as cut_extrude10_sk1:
        with Locations(Location((-32.5, -10.75, 0), (0, 0, 90))):
            Circle(SKETCH14_R)
    cut_extrude10_tool1 = extrude(cut_extrude10_sk1.sketch, amount=-CUT_EXTRUDE10_REACH, mode=Mode.PRIVATE) & cut_extrude7_kept_piece.part
    # Sketch14 → Cut-Extrude10 (cut, up to next)
    with BuildSketch(Plane(origin=(0, 0, -5), x_dir=(-1, 0, 0), z_dir=(0, 0, -1)), mode=Mode.PRIVATE) as cut_extrude10_sk2:
        with Locations(Location((-7.5, -10.75, 0), (0, 0, 90))):
            Circle(SKETCH14_R)
    cut_extrude10_tool2 = extrude(cut_extrude10_sk2.sketch, amount=-CUT_EXTRUDE10_REACH, mode=Mode.PRIVATE) & cut_extrude7_kept_piece.part
    add(cut_extrude10_tool1.solids().sort_by_distance((32.5, -10.75, -5))[0], mode=Mode.SUBTRACT)
    add(cut_extrude10_tool2.solids().sort_by_distance((7.5, -10.75, -5))[0], mode=Mode.SUBTRACT)


solid = cut_extrude7_kept_piece.part
